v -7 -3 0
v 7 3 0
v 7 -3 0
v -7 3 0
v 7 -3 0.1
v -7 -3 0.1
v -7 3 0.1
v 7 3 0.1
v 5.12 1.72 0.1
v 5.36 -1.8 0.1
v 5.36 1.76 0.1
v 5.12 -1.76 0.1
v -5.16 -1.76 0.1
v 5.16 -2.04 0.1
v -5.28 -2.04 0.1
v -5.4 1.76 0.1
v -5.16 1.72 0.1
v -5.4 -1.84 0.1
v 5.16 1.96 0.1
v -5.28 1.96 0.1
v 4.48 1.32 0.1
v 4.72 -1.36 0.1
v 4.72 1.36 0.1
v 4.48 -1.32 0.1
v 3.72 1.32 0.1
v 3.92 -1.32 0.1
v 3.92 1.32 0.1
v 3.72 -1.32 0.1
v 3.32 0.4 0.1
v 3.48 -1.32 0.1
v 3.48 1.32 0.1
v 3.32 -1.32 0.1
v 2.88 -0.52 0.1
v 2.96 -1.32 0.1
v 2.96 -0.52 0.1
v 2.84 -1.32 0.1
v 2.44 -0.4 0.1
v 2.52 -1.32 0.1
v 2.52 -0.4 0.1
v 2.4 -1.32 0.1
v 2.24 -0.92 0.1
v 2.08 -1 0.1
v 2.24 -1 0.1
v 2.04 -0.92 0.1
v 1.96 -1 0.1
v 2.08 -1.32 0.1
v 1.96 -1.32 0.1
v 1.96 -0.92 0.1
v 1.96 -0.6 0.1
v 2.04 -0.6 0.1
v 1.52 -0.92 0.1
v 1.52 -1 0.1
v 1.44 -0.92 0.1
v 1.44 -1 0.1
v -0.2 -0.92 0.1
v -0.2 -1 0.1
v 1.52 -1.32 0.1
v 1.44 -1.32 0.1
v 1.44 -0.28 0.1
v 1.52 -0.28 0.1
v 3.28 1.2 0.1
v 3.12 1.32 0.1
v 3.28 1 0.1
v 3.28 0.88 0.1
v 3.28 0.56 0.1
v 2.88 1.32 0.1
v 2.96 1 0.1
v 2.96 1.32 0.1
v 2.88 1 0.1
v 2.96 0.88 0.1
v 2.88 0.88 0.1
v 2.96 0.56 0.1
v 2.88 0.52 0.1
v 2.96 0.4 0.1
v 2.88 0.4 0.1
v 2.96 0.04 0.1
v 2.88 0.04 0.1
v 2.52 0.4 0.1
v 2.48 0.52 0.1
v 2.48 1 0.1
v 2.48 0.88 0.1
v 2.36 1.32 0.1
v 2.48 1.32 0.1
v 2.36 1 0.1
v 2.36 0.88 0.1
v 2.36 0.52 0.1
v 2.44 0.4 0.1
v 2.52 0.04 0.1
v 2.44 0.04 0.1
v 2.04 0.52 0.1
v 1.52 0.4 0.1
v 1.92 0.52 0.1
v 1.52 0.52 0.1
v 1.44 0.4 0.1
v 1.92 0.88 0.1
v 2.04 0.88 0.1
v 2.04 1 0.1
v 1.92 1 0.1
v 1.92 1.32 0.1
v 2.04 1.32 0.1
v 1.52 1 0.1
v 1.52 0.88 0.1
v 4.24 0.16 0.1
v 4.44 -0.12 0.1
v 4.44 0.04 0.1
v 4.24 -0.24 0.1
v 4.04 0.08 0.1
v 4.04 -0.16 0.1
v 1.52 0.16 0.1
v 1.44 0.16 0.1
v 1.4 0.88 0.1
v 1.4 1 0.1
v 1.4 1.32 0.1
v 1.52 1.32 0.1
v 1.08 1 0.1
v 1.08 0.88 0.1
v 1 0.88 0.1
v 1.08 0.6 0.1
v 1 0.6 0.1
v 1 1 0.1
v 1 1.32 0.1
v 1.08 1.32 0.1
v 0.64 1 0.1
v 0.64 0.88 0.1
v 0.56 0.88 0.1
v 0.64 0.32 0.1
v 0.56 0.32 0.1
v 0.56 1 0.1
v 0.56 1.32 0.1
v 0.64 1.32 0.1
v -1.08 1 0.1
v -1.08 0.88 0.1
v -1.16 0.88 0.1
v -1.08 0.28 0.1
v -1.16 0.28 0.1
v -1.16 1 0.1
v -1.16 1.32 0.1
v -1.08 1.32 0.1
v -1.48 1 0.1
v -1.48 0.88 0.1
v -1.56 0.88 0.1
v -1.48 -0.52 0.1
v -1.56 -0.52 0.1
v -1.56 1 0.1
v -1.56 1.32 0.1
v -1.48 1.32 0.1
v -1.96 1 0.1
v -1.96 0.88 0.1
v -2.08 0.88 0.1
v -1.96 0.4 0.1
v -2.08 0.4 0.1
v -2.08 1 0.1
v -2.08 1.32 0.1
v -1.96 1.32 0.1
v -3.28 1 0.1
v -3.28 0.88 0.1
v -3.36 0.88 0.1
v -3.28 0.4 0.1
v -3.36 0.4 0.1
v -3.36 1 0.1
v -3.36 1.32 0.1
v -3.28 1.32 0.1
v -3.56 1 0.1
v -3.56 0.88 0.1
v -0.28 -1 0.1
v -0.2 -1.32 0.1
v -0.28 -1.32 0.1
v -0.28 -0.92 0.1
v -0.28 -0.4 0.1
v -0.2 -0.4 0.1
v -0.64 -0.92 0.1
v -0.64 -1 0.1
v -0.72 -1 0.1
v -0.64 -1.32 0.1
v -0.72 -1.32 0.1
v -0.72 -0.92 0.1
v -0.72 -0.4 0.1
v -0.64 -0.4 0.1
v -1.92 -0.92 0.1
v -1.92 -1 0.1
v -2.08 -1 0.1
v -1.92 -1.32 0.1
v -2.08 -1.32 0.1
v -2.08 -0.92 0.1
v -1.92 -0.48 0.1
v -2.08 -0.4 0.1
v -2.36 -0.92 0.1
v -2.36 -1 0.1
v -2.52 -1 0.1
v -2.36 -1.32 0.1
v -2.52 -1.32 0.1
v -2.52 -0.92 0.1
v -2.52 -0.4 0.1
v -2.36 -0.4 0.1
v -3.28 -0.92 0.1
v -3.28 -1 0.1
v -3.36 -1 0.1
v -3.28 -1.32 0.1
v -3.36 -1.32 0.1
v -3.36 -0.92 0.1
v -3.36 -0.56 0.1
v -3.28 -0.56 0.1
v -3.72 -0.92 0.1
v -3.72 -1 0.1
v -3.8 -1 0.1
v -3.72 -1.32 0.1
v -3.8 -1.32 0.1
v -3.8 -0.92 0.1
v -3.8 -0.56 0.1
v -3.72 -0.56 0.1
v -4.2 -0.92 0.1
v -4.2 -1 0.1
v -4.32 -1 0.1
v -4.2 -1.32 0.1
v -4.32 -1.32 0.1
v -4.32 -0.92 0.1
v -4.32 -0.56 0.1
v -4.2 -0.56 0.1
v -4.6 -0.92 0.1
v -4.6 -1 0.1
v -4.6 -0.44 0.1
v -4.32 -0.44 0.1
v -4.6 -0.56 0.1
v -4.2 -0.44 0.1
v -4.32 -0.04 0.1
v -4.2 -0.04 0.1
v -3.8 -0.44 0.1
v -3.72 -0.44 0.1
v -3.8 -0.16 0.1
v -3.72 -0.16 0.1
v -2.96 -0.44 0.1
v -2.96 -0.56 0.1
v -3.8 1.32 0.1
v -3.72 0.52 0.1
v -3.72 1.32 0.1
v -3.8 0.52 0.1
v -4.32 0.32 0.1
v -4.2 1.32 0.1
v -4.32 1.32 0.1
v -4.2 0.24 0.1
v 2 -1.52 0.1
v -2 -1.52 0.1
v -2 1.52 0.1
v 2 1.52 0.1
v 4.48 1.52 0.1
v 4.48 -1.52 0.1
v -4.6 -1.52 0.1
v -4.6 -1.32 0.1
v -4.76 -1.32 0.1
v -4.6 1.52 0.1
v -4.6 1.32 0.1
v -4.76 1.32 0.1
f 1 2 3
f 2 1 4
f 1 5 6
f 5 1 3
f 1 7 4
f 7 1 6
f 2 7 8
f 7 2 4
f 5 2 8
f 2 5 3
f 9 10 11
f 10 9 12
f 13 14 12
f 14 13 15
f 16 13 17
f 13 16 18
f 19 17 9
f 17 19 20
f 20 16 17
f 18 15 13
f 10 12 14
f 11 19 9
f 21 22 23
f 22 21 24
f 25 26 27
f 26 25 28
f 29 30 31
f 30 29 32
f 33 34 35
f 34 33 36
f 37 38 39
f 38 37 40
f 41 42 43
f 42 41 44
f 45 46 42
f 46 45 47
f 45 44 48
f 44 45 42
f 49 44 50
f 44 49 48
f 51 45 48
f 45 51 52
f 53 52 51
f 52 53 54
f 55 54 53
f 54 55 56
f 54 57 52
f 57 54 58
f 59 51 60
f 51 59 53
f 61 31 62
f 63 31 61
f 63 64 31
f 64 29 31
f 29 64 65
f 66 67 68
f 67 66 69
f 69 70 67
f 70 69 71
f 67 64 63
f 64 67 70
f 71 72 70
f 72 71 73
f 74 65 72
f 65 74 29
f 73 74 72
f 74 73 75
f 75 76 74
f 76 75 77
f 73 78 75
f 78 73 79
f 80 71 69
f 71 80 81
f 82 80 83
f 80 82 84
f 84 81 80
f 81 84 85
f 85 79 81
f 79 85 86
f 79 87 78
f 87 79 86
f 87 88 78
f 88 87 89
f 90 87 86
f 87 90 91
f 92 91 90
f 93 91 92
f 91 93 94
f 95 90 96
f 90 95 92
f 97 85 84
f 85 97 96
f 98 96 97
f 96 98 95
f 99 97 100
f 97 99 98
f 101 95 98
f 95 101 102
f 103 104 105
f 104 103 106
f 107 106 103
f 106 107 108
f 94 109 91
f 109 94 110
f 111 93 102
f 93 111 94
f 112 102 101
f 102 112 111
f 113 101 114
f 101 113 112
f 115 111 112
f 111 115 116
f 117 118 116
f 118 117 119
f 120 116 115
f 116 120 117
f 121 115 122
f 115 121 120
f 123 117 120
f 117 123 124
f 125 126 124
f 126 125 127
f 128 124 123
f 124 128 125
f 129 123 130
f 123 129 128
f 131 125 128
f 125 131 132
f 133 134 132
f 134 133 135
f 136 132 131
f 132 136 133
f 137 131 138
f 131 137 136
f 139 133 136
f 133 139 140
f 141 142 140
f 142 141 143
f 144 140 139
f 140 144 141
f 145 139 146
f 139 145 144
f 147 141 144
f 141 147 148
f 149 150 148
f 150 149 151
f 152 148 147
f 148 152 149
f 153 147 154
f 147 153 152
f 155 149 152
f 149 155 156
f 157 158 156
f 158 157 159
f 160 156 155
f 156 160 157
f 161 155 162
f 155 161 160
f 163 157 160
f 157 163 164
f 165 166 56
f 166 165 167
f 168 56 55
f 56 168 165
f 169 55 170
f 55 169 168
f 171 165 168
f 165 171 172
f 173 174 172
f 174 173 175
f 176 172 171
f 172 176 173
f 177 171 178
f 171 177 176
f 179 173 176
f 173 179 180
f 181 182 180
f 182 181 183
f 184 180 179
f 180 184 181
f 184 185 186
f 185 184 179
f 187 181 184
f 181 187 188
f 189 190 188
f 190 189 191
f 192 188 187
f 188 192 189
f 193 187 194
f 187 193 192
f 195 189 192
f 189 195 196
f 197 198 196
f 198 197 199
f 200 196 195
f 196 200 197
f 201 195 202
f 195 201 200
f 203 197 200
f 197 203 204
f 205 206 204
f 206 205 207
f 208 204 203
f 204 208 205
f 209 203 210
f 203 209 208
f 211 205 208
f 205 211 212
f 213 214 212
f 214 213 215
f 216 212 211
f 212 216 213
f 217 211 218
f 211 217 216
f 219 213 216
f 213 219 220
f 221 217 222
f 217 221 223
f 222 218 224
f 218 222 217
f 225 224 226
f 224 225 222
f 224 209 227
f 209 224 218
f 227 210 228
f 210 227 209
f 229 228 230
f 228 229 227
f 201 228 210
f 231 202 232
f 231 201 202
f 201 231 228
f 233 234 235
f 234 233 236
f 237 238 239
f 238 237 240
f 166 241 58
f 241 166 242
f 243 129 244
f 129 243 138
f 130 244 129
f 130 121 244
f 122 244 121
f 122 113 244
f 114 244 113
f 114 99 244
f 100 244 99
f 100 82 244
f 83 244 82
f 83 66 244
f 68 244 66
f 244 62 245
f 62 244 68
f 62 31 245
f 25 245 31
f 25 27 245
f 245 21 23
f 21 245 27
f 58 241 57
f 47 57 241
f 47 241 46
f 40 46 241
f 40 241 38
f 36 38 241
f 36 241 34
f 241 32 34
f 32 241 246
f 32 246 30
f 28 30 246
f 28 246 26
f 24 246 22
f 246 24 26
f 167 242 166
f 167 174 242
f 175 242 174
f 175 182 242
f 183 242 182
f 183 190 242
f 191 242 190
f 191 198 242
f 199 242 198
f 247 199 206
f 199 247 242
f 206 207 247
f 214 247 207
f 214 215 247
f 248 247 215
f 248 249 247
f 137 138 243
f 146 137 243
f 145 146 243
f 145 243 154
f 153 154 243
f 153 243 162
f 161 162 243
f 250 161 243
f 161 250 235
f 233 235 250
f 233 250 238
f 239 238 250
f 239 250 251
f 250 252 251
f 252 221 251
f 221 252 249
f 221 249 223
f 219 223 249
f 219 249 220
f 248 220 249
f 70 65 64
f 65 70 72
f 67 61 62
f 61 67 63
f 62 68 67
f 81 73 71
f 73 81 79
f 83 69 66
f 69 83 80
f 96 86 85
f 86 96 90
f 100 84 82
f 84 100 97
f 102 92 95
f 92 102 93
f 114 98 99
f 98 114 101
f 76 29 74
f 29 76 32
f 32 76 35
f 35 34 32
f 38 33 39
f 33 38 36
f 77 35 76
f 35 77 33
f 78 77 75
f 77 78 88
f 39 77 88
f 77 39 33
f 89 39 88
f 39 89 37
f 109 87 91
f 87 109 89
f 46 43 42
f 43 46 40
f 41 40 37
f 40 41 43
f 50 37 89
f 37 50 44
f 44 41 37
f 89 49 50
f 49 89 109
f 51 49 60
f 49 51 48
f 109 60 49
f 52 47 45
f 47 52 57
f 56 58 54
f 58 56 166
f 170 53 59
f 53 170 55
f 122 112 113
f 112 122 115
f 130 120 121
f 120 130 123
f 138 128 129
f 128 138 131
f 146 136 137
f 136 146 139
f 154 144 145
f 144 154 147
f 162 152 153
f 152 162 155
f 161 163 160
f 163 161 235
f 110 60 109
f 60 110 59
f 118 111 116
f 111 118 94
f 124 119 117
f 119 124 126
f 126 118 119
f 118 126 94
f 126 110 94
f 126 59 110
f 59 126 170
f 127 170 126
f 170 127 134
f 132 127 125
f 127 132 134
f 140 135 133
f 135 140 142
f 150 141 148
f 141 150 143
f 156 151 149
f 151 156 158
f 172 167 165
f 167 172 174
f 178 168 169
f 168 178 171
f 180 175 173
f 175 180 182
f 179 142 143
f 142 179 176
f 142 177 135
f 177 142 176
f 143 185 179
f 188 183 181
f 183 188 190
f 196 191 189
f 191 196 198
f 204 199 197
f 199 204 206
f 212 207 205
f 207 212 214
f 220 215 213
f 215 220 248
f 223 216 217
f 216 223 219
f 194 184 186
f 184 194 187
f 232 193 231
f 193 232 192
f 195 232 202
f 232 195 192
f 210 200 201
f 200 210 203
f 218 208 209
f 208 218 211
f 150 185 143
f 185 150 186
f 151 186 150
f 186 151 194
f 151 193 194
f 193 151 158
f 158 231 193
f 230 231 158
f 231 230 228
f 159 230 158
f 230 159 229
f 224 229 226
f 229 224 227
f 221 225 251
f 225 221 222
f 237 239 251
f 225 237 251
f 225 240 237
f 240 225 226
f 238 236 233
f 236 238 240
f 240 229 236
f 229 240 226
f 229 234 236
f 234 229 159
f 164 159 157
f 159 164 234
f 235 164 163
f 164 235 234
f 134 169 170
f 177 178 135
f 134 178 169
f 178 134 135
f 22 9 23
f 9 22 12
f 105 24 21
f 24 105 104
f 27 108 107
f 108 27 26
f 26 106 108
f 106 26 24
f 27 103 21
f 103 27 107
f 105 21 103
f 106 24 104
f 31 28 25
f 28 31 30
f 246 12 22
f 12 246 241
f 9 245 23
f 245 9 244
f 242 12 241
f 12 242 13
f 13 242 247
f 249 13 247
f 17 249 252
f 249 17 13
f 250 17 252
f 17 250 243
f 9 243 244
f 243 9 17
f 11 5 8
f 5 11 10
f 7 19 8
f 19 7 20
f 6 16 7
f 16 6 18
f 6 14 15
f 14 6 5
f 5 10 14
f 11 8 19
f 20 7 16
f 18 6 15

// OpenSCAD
// file: ../p/box5-12.scad
use <../lib.scad>
function ldraw_lib__box5_12() = [
// 0 Box with 5 Faces without Any Edges
// 0 Name: box5-12.dat
// 0 Author: Chris Dee [cwdee]
// 0 !LDRAW_ORG Primitive UPDATE 2009-02
// 0 !LICENSE Licensed under CC BY 2.0 and CC BY 4.0 : see CAreadme.txt
// 
// 0 BFC CERTIFY CCW
  [0,"BFC","CERTIFY"],
  [0,"BFC","CCW"],
// 
// 0 !HISTORY 2009-09-03 [PTadmin] Official Update 2009-02
// 
// 
// 4 16 1 1 1 1 1 -1 -1 1 -1 -1 1 1
  [4,16,1,1,1,1,1,-1,-1,1,-1,-1,1,1],
// 4 16 -1 0 1 1 0 1 1 1 1 -1 1 1
  [4,16,-1,0,1,1,0,1,1,1,1,-1,1,1],
// 4 16 -1 0 -1 -1 0 1 -1 1 1 -1 1 -1
  [4,16,-1,0,-1,-1,0,1,-1,1,1,-1,1,-1],
// 4 16 1 0 -1 -1 0 -1 -1 1 -1 1 1 -1
  [4,16,1,0,-1,-1,0,-1,-1,1,-1,1,1,-1],
// 4 16 1 0 1 1 0 -1 1 1 -1 1 1 1
  [4,16,1,0,1,1,0,-1,1,1,-1,1,1,1],
// 0
];
makepoly(ldraw_lib__box5_12(), line=0.2);
// main file
use <../lib.scad>
use <4622303m.scad>
function ldraw_lib__4622303n() = [
// 0 Sticker  0.75 x  1.75 Turn Indicator Right on Orange
// 0 Name: 4622303n.dat
// 0 Author: J.C. Tchang [tchang]
// 0 !LDRAW_ORG Part UPDATE 2012-02
// 0 !LICENSE Licensed under CC BY 2.0 and CC BY 4.0 : see CAreadme.txt
// 
// 0 BFC CERTIFY CCW
  [0,"BFC","CERTIFY"],
  [0,"BFC","CCW"],
// 
// 0 !KEYWORDS set 8110, Unimog
// 
// 0 !HISTORY 2012-08-09 [PTadmin] Official Update 2012-02
// 
// 
// 1 16 0 0 0 -1 0 0 0 1 0 0 0 1 4622303m.dat
  [1,16,0,0,0,-1,0,0,0,1,0,0,0,1, ldraw_lib__4622303m()],
];
makepoly(ldraw_lib__4622303n(), line=0.2);
